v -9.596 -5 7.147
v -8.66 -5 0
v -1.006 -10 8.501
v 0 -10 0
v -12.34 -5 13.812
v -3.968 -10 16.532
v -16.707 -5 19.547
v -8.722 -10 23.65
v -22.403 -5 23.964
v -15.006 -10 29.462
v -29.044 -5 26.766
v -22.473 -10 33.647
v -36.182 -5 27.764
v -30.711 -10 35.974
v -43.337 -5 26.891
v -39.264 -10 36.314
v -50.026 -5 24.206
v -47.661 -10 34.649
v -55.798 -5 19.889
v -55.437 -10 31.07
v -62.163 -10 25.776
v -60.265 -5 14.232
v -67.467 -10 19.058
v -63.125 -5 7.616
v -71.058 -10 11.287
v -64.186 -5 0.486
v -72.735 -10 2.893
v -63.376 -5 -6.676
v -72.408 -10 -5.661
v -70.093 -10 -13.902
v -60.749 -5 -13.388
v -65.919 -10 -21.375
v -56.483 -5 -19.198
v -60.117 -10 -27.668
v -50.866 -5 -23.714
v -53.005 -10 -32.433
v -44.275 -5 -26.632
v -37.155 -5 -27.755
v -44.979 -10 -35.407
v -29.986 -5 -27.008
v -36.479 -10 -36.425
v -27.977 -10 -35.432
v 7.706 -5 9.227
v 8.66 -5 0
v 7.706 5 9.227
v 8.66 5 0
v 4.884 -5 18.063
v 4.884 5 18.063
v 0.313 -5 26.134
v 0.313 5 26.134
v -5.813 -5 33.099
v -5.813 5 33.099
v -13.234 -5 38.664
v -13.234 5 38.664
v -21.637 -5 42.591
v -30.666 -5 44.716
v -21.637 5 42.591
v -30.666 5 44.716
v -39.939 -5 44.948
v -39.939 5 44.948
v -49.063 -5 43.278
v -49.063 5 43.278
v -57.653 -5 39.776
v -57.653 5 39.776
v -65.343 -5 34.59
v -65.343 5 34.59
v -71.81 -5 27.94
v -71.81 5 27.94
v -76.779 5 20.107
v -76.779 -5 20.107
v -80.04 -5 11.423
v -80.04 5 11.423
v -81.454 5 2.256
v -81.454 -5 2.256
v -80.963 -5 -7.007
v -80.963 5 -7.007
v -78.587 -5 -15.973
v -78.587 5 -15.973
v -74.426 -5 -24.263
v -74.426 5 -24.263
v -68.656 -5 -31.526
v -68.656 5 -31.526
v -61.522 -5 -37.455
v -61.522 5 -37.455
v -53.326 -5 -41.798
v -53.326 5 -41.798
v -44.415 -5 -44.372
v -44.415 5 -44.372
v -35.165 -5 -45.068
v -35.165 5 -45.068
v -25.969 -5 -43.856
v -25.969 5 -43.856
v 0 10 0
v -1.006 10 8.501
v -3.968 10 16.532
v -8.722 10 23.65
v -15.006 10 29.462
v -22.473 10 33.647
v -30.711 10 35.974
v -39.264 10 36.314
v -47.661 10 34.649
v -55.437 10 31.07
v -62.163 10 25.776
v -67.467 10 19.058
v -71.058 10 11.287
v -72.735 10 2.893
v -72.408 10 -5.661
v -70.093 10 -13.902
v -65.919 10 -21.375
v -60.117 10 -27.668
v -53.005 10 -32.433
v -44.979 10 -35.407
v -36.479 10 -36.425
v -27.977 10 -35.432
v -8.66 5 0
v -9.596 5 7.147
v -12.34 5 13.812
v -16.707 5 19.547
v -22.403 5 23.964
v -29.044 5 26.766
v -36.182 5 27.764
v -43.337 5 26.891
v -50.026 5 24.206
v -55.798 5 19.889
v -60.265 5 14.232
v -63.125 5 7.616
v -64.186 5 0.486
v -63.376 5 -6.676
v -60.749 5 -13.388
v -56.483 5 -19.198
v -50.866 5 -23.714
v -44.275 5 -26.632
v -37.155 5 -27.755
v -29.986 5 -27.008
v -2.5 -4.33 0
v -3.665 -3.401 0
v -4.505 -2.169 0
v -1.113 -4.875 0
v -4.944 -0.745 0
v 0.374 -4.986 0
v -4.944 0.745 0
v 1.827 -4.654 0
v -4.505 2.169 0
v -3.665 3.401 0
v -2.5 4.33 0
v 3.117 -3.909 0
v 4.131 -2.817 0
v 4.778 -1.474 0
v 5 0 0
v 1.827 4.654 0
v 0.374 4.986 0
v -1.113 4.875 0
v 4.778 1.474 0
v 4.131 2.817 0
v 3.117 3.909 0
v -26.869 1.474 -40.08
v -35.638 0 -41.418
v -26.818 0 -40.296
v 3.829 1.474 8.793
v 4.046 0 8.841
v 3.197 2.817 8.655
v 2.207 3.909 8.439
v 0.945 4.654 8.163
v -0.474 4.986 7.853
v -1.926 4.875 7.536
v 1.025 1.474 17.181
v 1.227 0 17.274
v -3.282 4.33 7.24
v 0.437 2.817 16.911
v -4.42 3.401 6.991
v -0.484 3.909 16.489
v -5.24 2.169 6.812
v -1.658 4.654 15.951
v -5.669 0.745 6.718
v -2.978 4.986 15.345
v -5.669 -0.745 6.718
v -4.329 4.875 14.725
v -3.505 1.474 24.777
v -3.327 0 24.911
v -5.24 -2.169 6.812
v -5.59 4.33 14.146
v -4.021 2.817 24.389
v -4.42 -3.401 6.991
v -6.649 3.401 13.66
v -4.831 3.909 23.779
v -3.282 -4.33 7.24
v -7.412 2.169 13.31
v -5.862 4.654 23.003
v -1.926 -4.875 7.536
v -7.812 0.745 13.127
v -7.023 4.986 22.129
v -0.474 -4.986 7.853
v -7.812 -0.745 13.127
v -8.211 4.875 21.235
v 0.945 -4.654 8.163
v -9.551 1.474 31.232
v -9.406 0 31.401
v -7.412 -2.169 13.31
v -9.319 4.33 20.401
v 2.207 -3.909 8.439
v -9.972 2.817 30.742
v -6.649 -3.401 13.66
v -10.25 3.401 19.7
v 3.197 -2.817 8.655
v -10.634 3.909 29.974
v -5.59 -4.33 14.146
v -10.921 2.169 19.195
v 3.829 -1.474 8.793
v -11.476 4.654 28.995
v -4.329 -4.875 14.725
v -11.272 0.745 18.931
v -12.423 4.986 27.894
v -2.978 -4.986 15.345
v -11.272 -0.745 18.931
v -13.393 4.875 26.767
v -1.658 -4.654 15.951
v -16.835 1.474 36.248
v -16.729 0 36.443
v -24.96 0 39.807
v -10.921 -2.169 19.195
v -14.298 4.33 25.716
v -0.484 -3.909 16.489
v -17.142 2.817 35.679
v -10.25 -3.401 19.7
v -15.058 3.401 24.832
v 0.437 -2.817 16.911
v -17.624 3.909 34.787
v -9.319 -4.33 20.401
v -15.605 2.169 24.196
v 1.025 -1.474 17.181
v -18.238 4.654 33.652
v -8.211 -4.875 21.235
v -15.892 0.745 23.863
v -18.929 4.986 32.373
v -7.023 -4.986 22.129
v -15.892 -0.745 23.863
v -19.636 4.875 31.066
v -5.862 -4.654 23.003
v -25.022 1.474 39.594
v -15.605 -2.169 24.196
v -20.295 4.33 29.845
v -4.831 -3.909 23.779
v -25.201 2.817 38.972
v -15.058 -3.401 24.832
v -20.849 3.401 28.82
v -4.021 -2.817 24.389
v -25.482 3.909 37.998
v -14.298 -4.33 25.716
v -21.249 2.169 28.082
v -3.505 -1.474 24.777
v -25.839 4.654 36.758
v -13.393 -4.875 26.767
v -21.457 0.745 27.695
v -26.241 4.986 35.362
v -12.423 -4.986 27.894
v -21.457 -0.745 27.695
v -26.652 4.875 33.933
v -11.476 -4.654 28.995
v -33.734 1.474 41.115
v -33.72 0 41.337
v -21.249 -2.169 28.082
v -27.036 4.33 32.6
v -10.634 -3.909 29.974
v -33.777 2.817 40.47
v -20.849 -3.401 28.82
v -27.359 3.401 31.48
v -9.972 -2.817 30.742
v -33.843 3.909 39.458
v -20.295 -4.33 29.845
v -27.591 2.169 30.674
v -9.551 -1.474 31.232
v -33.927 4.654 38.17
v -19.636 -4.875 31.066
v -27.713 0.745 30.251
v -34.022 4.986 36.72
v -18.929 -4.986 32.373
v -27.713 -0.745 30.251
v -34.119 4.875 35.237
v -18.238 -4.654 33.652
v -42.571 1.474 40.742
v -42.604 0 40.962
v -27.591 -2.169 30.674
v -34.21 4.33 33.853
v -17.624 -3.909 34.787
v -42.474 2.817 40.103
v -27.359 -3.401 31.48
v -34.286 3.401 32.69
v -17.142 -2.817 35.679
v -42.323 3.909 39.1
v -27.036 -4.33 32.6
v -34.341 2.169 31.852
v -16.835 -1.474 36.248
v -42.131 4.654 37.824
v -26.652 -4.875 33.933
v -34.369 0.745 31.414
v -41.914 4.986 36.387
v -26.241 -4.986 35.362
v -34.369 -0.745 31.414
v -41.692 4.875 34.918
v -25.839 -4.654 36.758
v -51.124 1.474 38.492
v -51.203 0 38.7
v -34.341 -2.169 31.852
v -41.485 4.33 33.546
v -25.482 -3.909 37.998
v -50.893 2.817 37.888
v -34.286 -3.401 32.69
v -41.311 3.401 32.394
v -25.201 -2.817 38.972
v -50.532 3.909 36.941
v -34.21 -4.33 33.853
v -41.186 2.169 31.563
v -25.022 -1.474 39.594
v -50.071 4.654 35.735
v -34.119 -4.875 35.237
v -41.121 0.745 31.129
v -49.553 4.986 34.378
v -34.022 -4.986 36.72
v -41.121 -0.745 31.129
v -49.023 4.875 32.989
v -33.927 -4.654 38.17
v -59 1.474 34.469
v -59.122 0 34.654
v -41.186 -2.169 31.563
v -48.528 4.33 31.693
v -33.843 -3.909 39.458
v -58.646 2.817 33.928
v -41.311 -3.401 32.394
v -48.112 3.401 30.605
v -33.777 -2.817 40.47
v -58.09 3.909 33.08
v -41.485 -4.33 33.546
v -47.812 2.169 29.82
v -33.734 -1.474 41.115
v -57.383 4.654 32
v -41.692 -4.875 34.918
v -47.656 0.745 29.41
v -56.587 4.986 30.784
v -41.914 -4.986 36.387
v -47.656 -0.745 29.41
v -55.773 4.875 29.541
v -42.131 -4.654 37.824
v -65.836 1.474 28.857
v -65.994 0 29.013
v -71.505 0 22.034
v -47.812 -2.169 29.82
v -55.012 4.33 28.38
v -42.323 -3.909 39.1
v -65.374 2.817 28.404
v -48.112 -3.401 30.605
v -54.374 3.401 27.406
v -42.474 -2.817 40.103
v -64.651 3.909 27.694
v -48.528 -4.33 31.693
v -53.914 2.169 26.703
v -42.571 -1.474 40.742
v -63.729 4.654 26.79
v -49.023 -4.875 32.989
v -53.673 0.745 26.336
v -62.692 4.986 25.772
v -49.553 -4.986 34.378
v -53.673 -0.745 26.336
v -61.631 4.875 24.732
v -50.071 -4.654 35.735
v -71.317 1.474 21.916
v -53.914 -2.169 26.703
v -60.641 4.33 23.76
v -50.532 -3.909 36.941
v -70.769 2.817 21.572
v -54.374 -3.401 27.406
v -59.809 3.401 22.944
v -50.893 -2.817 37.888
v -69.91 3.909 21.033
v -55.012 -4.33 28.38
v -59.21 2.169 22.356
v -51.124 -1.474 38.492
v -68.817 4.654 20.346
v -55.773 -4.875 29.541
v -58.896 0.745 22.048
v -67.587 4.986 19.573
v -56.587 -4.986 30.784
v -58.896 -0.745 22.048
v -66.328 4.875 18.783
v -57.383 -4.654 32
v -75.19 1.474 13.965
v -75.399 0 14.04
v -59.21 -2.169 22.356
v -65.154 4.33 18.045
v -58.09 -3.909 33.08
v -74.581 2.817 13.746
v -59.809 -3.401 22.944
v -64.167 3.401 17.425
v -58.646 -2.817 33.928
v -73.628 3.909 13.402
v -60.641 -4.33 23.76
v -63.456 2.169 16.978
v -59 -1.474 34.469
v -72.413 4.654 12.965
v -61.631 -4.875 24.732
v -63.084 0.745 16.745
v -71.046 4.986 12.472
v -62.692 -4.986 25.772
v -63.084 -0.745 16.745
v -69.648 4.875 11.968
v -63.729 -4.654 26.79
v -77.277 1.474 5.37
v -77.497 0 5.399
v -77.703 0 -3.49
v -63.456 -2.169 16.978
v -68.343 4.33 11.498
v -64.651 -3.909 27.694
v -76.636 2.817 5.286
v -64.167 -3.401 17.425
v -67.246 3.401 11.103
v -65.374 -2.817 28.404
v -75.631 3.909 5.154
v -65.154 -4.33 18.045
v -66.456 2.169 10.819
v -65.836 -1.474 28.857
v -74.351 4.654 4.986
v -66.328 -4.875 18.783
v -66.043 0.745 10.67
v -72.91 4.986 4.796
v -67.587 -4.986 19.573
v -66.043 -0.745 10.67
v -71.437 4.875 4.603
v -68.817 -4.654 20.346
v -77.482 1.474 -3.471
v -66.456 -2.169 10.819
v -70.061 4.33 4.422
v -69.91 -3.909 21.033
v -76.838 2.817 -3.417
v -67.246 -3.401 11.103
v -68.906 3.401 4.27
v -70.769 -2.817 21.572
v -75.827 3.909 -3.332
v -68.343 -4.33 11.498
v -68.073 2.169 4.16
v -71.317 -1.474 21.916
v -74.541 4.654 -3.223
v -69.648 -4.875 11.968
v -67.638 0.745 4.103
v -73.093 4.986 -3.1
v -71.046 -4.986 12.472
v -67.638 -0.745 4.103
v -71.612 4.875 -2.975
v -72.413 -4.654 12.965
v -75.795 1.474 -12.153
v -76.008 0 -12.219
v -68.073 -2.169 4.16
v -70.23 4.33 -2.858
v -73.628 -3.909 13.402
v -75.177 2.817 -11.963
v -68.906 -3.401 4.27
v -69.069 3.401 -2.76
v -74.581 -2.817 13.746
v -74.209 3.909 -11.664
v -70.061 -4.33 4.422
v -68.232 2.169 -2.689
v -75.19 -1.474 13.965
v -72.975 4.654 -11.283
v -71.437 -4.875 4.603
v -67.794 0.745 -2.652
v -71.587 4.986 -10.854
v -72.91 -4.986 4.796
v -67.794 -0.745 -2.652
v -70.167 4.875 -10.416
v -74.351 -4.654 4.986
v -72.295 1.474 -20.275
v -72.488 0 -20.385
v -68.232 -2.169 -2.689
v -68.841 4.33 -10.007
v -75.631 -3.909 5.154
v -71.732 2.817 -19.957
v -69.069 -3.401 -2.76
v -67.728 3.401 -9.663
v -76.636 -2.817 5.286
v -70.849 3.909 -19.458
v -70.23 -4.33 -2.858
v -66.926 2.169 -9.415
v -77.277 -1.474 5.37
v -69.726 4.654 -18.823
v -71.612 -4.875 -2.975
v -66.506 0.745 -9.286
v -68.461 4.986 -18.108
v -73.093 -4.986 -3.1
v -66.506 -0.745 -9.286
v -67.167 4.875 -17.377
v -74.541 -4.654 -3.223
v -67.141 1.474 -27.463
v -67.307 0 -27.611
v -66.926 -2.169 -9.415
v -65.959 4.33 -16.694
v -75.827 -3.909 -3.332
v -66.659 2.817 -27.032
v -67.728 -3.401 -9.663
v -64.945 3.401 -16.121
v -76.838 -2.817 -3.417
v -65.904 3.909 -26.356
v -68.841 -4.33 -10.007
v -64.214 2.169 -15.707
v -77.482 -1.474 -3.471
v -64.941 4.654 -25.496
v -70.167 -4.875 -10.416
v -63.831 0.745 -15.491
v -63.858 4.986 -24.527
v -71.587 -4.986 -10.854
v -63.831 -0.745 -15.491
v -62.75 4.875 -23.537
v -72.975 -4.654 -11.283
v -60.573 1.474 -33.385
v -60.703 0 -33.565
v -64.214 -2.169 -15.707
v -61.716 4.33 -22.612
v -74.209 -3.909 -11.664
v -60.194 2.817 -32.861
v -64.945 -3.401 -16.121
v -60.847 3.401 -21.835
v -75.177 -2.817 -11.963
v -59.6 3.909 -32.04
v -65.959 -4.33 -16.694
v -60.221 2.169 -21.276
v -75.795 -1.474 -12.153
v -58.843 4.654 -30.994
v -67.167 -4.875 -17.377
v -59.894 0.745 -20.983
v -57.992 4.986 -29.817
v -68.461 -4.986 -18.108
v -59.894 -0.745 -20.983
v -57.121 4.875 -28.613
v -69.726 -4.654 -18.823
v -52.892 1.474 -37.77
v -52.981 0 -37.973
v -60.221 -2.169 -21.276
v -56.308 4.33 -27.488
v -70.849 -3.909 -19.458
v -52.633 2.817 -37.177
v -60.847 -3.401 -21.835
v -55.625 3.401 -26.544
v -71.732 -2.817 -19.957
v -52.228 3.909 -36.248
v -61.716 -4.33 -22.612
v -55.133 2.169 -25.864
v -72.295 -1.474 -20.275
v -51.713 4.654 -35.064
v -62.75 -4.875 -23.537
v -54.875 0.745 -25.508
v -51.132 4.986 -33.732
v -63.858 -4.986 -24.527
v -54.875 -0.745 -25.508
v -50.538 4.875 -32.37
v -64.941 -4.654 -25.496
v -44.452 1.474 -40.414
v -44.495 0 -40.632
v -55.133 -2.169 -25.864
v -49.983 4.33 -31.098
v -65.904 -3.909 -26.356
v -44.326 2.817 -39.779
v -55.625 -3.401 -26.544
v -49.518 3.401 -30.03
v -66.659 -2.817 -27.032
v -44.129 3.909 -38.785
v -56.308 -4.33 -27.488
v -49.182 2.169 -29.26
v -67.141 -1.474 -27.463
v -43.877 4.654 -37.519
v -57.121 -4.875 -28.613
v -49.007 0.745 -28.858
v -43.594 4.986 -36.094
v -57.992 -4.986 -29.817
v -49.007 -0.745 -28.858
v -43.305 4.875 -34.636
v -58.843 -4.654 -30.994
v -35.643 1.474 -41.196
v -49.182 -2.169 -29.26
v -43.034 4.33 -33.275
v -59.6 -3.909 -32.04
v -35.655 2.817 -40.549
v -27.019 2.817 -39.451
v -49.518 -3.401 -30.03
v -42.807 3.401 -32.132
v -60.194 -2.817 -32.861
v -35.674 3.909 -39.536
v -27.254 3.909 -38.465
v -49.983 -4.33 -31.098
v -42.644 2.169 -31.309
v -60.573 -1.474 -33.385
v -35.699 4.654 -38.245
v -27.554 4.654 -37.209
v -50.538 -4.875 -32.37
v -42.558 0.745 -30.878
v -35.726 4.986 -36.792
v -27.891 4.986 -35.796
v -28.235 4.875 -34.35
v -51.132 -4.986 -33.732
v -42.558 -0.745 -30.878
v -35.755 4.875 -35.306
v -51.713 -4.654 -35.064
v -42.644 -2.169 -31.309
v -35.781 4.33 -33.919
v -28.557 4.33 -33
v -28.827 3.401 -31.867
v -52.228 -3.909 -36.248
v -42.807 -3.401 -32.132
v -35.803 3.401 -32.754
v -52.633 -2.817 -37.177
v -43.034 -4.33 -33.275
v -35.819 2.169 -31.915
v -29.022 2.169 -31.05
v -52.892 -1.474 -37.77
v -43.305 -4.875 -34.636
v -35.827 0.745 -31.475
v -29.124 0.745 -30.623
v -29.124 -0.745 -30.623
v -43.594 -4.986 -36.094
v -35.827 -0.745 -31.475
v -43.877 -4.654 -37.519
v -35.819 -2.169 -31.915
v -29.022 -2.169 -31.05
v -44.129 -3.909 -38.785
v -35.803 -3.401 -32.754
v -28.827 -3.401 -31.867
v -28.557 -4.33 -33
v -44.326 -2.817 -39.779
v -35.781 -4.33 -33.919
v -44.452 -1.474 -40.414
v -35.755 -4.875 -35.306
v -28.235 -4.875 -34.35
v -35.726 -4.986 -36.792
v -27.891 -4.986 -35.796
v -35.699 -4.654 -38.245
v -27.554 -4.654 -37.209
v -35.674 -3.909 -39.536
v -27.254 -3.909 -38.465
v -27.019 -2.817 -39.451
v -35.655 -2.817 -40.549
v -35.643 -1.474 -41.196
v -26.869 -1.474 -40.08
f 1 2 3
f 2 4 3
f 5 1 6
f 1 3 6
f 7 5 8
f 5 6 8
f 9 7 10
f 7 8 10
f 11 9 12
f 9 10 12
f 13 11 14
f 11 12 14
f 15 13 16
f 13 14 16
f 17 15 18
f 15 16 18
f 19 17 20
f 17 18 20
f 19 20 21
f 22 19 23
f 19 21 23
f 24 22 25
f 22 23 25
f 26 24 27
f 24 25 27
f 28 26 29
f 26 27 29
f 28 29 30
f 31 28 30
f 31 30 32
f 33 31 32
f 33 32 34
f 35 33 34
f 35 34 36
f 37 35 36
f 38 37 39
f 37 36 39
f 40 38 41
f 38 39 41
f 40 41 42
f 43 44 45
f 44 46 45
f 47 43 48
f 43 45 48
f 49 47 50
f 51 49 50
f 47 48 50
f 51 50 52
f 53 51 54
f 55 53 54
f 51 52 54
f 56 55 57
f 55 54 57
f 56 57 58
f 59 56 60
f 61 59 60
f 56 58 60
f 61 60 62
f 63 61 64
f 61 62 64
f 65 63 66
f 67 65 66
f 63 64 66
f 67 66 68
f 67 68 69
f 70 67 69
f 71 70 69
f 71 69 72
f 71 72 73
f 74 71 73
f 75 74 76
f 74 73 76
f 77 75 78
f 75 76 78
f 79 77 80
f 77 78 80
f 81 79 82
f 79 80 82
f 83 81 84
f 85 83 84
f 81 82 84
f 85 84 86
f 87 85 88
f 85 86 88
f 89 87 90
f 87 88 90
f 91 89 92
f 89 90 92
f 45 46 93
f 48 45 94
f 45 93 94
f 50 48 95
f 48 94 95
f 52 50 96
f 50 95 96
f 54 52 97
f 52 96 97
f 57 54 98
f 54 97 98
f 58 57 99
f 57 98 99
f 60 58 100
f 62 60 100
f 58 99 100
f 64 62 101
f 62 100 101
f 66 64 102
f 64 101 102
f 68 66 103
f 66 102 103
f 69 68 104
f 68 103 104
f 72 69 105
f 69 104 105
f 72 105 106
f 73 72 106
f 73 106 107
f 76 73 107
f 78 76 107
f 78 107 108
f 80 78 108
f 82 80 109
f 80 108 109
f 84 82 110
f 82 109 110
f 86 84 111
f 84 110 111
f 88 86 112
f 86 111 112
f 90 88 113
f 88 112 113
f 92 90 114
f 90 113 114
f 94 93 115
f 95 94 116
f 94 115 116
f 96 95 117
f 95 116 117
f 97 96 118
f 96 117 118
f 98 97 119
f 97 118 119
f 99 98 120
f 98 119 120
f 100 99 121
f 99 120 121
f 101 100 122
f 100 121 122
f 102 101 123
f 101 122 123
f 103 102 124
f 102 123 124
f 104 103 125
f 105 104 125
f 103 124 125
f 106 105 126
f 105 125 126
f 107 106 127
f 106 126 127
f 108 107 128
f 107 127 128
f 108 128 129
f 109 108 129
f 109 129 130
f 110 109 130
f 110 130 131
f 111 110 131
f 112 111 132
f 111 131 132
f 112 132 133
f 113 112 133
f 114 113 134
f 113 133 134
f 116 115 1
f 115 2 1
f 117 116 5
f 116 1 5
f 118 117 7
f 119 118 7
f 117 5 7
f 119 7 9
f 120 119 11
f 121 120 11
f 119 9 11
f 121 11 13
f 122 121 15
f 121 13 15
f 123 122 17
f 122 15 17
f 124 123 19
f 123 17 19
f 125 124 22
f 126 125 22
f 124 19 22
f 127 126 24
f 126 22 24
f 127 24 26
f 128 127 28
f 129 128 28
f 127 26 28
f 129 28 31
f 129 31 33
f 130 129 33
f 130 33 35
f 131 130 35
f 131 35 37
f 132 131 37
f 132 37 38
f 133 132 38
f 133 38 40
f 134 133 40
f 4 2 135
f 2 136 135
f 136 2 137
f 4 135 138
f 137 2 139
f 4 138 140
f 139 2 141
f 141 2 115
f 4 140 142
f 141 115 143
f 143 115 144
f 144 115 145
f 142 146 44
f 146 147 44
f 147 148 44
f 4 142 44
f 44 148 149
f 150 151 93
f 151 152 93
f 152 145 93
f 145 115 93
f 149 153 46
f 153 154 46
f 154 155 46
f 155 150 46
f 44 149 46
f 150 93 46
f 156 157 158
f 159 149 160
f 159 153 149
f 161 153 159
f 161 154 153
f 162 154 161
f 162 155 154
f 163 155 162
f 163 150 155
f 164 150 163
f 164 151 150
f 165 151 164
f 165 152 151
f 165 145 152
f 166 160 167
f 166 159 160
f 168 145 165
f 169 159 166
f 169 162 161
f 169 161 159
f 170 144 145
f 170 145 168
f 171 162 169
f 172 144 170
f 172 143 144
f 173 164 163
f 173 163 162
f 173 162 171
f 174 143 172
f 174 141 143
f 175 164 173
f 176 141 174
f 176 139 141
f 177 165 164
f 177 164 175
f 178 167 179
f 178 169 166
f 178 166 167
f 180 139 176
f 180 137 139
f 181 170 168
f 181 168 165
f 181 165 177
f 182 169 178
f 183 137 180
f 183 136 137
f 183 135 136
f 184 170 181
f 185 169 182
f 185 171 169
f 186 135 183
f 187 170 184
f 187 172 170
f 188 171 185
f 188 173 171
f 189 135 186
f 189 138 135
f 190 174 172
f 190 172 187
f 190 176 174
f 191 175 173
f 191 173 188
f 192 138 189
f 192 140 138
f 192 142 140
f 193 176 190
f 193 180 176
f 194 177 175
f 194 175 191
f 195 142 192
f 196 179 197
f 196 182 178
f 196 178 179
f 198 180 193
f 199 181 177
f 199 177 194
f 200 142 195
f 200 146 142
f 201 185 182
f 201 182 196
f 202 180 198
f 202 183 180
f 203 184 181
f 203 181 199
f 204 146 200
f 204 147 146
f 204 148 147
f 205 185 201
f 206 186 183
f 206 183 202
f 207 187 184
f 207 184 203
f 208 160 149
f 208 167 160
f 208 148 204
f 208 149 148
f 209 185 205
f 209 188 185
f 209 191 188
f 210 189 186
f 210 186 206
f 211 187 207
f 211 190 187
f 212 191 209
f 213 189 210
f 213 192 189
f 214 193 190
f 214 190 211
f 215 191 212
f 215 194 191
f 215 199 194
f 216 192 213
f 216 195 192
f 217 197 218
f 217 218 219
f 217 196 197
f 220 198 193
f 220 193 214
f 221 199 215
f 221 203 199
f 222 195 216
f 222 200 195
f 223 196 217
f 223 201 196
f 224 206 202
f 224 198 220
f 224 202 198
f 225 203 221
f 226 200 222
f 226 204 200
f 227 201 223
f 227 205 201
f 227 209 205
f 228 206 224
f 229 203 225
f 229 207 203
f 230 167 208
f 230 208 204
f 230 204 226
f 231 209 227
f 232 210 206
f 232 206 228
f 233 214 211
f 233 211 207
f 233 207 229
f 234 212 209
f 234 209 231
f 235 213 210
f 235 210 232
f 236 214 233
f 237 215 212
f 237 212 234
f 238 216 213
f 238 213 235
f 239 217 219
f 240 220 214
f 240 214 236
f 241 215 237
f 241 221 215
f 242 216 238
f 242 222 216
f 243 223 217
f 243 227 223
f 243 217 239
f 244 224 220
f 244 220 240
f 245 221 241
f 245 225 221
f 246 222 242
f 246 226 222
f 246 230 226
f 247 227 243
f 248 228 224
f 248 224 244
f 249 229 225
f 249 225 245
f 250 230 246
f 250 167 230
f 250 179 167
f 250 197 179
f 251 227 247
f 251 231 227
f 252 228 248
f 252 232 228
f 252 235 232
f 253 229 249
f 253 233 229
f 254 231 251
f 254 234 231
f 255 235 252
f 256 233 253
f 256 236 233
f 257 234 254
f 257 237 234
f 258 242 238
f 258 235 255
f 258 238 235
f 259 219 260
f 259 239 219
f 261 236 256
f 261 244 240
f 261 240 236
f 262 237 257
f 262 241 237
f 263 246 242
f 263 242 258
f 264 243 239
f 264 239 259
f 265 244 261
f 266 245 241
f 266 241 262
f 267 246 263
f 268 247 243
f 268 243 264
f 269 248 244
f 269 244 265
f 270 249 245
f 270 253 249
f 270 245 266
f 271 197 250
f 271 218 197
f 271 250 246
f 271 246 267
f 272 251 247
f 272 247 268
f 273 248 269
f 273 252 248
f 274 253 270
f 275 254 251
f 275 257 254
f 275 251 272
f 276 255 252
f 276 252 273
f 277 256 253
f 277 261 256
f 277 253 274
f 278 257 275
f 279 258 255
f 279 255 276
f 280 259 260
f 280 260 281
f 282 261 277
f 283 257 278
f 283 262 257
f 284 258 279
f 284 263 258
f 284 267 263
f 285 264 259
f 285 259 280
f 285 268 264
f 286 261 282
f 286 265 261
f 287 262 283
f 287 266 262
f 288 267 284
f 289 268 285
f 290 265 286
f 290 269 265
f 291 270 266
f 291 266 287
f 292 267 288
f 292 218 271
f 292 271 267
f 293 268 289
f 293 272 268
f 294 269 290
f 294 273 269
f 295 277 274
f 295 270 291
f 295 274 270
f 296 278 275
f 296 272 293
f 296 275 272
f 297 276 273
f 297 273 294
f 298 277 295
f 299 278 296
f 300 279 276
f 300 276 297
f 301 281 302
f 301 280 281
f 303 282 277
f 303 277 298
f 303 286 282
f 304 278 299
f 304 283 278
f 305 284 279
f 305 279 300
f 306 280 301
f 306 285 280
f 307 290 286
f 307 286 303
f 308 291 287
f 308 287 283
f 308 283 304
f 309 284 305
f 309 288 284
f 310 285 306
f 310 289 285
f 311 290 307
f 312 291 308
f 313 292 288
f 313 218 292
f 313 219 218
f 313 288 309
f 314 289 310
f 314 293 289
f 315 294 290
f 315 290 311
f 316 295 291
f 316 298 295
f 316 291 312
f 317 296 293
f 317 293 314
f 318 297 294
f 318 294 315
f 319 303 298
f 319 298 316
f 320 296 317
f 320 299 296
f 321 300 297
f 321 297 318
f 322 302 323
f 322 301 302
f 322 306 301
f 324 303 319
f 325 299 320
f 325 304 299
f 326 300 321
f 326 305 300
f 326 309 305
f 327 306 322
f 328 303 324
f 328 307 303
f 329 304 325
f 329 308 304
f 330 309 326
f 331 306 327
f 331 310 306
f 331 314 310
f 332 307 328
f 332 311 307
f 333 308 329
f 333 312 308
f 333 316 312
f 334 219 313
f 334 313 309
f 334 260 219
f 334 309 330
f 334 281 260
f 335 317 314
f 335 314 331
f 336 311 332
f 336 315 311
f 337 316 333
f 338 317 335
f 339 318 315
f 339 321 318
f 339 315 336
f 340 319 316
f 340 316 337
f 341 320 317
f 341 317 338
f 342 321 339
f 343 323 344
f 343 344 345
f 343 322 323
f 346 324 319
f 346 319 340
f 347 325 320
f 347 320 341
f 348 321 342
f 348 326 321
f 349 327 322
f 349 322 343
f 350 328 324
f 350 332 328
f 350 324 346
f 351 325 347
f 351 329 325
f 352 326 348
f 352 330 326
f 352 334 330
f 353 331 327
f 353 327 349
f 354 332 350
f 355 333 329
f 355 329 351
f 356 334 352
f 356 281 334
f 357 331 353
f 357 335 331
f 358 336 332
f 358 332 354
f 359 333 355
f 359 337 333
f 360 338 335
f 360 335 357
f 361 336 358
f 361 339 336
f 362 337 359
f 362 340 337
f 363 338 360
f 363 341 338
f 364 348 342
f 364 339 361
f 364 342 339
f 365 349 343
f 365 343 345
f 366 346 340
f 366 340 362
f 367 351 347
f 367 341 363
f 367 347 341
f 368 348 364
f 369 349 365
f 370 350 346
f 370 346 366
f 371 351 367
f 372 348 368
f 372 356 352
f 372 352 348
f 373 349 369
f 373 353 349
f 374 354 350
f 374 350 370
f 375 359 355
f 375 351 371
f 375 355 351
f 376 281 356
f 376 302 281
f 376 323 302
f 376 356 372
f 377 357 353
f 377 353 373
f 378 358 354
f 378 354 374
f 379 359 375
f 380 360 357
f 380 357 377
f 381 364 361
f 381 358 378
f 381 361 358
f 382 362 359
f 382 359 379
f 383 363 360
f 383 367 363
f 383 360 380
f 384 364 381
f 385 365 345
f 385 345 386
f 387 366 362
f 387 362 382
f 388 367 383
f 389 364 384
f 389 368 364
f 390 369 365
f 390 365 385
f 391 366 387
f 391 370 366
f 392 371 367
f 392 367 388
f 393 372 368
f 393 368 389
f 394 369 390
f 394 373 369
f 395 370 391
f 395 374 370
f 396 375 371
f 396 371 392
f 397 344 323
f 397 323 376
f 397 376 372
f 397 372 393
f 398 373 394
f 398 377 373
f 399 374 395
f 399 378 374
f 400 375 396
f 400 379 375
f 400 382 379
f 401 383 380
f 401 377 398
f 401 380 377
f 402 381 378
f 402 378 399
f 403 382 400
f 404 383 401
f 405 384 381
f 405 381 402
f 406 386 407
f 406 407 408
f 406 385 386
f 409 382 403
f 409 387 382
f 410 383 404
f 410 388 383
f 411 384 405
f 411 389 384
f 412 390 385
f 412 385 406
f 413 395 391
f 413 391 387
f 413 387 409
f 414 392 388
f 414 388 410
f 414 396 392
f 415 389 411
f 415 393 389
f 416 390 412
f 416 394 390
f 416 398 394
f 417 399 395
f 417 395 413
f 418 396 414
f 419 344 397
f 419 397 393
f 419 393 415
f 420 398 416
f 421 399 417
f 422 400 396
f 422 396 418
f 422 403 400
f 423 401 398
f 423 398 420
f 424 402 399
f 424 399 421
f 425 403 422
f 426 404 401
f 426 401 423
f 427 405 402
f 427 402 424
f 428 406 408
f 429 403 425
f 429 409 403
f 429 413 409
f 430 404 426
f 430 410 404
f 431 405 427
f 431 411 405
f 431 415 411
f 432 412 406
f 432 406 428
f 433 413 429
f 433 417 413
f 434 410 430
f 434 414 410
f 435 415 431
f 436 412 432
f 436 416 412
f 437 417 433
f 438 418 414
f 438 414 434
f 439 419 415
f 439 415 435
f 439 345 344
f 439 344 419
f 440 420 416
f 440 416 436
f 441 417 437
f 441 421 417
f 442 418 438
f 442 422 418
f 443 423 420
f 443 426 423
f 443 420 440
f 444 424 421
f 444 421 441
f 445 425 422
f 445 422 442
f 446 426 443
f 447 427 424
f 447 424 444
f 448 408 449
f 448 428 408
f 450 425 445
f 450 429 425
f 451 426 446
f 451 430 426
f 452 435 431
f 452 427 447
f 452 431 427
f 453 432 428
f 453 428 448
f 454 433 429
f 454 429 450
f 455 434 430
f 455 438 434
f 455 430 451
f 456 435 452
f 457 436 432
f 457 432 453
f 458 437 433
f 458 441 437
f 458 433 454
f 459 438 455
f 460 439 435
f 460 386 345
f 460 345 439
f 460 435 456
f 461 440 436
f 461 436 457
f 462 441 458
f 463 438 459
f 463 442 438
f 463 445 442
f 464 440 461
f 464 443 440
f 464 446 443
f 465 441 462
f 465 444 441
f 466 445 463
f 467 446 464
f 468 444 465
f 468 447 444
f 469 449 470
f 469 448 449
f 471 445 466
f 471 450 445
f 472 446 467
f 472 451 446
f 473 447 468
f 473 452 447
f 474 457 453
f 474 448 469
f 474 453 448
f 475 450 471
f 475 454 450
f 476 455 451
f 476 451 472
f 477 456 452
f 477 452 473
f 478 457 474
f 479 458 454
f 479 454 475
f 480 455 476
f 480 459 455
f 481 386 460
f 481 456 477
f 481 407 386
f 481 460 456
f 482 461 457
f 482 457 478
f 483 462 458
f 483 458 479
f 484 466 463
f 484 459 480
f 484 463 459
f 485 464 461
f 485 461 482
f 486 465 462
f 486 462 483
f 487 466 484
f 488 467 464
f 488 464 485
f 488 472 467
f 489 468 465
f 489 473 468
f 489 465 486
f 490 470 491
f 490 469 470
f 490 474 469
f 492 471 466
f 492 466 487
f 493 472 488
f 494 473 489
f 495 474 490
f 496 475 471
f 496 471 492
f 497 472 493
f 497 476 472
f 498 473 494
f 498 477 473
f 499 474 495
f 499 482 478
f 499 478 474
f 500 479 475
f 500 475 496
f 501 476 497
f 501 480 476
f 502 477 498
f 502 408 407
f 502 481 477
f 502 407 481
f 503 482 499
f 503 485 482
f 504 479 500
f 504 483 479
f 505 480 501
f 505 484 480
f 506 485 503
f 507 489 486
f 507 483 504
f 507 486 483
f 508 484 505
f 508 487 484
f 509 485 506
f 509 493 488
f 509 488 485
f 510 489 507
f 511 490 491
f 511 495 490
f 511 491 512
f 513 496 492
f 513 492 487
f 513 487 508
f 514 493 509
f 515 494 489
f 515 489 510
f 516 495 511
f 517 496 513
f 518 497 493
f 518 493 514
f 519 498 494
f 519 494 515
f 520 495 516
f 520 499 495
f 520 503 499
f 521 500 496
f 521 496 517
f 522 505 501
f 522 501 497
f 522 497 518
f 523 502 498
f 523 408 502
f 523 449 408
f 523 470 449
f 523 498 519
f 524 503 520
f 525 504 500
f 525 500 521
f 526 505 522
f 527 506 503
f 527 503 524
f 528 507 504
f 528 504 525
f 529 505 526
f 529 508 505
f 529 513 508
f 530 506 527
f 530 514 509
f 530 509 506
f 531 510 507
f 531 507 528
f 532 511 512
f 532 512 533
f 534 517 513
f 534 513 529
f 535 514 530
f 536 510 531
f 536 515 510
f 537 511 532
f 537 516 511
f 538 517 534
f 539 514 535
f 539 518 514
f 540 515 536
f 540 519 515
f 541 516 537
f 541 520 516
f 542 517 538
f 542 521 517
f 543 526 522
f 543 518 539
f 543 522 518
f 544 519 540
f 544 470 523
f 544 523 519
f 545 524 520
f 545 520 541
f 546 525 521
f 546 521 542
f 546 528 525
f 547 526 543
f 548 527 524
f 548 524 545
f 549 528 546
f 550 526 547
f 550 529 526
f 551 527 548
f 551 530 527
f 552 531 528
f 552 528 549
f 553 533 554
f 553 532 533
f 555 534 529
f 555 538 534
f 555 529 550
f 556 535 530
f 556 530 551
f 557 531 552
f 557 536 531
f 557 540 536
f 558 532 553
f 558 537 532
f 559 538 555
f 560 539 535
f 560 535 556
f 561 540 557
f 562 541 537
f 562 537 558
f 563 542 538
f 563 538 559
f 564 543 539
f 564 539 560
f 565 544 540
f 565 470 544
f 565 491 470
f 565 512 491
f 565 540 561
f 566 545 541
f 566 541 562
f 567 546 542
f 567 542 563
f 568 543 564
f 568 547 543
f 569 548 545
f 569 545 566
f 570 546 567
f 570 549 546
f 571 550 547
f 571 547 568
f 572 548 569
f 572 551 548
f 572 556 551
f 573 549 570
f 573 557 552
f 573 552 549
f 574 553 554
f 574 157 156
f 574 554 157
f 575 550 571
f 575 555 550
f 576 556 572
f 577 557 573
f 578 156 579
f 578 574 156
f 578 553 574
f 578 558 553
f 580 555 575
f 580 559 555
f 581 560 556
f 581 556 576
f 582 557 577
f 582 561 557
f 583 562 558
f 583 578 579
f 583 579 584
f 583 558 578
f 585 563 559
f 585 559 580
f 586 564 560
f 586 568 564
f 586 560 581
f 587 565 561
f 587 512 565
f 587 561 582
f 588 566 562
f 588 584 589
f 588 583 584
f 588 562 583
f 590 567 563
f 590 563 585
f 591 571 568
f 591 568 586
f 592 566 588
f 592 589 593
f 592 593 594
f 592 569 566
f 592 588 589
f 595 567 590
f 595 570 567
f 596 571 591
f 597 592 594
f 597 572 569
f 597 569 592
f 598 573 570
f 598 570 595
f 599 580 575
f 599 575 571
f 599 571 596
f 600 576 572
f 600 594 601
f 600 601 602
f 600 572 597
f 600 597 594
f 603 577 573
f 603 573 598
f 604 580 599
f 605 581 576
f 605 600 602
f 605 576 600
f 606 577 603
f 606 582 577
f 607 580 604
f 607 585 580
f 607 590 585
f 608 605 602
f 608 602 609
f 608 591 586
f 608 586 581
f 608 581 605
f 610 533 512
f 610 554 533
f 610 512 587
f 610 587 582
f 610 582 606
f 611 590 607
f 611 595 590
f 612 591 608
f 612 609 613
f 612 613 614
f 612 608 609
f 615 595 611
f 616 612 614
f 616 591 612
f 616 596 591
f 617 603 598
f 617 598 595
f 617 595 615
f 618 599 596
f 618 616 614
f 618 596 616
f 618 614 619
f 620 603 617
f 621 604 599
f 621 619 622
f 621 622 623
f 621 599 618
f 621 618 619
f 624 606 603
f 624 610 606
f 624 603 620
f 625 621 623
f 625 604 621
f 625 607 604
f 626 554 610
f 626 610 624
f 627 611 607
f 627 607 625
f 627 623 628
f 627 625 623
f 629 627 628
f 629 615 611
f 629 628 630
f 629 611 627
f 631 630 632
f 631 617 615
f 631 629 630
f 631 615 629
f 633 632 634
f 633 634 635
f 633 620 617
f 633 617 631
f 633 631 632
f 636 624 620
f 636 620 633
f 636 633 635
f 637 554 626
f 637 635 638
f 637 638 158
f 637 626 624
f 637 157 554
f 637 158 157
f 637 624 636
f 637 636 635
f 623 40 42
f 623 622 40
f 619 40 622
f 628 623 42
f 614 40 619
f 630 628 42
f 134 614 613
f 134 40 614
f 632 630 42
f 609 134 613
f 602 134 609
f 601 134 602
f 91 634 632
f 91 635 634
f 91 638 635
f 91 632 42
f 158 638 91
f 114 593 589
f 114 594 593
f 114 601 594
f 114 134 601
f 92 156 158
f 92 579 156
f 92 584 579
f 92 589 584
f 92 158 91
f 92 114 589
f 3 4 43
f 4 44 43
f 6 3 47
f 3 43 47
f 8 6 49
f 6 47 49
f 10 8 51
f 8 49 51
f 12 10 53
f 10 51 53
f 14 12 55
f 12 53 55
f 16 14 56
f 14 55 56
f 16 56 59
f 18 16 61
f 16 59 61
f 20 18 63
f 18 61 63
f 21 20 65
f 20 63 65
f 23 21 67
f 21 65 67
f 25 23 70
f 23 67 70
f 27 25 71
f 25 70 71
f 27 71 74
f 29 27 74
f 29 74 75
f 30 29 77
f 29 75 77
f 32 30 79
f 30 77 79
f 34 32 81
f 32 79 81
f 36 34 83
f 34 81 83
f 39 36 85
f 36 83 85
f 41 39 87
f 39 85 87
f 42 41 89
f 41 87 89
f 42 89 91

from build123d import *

# Parameters (mm, degrees)
F0_R     = 5
F1_ANGLE = 283.41057


with BuildPart() as f1:
    # F0 (on Top) → F1 (revolve)
    with BuildSketch(Plane.XY):
        Polygon((8.660254, -5), (8.660254, 5), (0, 10), (-8.660254, 5), (-8.660254, -5), (0, -10), align=None)
        Circle(F0_R, mode=Mode.SUBTRACT)
    revolve(axis=Axis((-36.425274, -12.058022, 0), (0, -1, 0)), revolution_arc=F1_ANGLE)


solid = f1.part
